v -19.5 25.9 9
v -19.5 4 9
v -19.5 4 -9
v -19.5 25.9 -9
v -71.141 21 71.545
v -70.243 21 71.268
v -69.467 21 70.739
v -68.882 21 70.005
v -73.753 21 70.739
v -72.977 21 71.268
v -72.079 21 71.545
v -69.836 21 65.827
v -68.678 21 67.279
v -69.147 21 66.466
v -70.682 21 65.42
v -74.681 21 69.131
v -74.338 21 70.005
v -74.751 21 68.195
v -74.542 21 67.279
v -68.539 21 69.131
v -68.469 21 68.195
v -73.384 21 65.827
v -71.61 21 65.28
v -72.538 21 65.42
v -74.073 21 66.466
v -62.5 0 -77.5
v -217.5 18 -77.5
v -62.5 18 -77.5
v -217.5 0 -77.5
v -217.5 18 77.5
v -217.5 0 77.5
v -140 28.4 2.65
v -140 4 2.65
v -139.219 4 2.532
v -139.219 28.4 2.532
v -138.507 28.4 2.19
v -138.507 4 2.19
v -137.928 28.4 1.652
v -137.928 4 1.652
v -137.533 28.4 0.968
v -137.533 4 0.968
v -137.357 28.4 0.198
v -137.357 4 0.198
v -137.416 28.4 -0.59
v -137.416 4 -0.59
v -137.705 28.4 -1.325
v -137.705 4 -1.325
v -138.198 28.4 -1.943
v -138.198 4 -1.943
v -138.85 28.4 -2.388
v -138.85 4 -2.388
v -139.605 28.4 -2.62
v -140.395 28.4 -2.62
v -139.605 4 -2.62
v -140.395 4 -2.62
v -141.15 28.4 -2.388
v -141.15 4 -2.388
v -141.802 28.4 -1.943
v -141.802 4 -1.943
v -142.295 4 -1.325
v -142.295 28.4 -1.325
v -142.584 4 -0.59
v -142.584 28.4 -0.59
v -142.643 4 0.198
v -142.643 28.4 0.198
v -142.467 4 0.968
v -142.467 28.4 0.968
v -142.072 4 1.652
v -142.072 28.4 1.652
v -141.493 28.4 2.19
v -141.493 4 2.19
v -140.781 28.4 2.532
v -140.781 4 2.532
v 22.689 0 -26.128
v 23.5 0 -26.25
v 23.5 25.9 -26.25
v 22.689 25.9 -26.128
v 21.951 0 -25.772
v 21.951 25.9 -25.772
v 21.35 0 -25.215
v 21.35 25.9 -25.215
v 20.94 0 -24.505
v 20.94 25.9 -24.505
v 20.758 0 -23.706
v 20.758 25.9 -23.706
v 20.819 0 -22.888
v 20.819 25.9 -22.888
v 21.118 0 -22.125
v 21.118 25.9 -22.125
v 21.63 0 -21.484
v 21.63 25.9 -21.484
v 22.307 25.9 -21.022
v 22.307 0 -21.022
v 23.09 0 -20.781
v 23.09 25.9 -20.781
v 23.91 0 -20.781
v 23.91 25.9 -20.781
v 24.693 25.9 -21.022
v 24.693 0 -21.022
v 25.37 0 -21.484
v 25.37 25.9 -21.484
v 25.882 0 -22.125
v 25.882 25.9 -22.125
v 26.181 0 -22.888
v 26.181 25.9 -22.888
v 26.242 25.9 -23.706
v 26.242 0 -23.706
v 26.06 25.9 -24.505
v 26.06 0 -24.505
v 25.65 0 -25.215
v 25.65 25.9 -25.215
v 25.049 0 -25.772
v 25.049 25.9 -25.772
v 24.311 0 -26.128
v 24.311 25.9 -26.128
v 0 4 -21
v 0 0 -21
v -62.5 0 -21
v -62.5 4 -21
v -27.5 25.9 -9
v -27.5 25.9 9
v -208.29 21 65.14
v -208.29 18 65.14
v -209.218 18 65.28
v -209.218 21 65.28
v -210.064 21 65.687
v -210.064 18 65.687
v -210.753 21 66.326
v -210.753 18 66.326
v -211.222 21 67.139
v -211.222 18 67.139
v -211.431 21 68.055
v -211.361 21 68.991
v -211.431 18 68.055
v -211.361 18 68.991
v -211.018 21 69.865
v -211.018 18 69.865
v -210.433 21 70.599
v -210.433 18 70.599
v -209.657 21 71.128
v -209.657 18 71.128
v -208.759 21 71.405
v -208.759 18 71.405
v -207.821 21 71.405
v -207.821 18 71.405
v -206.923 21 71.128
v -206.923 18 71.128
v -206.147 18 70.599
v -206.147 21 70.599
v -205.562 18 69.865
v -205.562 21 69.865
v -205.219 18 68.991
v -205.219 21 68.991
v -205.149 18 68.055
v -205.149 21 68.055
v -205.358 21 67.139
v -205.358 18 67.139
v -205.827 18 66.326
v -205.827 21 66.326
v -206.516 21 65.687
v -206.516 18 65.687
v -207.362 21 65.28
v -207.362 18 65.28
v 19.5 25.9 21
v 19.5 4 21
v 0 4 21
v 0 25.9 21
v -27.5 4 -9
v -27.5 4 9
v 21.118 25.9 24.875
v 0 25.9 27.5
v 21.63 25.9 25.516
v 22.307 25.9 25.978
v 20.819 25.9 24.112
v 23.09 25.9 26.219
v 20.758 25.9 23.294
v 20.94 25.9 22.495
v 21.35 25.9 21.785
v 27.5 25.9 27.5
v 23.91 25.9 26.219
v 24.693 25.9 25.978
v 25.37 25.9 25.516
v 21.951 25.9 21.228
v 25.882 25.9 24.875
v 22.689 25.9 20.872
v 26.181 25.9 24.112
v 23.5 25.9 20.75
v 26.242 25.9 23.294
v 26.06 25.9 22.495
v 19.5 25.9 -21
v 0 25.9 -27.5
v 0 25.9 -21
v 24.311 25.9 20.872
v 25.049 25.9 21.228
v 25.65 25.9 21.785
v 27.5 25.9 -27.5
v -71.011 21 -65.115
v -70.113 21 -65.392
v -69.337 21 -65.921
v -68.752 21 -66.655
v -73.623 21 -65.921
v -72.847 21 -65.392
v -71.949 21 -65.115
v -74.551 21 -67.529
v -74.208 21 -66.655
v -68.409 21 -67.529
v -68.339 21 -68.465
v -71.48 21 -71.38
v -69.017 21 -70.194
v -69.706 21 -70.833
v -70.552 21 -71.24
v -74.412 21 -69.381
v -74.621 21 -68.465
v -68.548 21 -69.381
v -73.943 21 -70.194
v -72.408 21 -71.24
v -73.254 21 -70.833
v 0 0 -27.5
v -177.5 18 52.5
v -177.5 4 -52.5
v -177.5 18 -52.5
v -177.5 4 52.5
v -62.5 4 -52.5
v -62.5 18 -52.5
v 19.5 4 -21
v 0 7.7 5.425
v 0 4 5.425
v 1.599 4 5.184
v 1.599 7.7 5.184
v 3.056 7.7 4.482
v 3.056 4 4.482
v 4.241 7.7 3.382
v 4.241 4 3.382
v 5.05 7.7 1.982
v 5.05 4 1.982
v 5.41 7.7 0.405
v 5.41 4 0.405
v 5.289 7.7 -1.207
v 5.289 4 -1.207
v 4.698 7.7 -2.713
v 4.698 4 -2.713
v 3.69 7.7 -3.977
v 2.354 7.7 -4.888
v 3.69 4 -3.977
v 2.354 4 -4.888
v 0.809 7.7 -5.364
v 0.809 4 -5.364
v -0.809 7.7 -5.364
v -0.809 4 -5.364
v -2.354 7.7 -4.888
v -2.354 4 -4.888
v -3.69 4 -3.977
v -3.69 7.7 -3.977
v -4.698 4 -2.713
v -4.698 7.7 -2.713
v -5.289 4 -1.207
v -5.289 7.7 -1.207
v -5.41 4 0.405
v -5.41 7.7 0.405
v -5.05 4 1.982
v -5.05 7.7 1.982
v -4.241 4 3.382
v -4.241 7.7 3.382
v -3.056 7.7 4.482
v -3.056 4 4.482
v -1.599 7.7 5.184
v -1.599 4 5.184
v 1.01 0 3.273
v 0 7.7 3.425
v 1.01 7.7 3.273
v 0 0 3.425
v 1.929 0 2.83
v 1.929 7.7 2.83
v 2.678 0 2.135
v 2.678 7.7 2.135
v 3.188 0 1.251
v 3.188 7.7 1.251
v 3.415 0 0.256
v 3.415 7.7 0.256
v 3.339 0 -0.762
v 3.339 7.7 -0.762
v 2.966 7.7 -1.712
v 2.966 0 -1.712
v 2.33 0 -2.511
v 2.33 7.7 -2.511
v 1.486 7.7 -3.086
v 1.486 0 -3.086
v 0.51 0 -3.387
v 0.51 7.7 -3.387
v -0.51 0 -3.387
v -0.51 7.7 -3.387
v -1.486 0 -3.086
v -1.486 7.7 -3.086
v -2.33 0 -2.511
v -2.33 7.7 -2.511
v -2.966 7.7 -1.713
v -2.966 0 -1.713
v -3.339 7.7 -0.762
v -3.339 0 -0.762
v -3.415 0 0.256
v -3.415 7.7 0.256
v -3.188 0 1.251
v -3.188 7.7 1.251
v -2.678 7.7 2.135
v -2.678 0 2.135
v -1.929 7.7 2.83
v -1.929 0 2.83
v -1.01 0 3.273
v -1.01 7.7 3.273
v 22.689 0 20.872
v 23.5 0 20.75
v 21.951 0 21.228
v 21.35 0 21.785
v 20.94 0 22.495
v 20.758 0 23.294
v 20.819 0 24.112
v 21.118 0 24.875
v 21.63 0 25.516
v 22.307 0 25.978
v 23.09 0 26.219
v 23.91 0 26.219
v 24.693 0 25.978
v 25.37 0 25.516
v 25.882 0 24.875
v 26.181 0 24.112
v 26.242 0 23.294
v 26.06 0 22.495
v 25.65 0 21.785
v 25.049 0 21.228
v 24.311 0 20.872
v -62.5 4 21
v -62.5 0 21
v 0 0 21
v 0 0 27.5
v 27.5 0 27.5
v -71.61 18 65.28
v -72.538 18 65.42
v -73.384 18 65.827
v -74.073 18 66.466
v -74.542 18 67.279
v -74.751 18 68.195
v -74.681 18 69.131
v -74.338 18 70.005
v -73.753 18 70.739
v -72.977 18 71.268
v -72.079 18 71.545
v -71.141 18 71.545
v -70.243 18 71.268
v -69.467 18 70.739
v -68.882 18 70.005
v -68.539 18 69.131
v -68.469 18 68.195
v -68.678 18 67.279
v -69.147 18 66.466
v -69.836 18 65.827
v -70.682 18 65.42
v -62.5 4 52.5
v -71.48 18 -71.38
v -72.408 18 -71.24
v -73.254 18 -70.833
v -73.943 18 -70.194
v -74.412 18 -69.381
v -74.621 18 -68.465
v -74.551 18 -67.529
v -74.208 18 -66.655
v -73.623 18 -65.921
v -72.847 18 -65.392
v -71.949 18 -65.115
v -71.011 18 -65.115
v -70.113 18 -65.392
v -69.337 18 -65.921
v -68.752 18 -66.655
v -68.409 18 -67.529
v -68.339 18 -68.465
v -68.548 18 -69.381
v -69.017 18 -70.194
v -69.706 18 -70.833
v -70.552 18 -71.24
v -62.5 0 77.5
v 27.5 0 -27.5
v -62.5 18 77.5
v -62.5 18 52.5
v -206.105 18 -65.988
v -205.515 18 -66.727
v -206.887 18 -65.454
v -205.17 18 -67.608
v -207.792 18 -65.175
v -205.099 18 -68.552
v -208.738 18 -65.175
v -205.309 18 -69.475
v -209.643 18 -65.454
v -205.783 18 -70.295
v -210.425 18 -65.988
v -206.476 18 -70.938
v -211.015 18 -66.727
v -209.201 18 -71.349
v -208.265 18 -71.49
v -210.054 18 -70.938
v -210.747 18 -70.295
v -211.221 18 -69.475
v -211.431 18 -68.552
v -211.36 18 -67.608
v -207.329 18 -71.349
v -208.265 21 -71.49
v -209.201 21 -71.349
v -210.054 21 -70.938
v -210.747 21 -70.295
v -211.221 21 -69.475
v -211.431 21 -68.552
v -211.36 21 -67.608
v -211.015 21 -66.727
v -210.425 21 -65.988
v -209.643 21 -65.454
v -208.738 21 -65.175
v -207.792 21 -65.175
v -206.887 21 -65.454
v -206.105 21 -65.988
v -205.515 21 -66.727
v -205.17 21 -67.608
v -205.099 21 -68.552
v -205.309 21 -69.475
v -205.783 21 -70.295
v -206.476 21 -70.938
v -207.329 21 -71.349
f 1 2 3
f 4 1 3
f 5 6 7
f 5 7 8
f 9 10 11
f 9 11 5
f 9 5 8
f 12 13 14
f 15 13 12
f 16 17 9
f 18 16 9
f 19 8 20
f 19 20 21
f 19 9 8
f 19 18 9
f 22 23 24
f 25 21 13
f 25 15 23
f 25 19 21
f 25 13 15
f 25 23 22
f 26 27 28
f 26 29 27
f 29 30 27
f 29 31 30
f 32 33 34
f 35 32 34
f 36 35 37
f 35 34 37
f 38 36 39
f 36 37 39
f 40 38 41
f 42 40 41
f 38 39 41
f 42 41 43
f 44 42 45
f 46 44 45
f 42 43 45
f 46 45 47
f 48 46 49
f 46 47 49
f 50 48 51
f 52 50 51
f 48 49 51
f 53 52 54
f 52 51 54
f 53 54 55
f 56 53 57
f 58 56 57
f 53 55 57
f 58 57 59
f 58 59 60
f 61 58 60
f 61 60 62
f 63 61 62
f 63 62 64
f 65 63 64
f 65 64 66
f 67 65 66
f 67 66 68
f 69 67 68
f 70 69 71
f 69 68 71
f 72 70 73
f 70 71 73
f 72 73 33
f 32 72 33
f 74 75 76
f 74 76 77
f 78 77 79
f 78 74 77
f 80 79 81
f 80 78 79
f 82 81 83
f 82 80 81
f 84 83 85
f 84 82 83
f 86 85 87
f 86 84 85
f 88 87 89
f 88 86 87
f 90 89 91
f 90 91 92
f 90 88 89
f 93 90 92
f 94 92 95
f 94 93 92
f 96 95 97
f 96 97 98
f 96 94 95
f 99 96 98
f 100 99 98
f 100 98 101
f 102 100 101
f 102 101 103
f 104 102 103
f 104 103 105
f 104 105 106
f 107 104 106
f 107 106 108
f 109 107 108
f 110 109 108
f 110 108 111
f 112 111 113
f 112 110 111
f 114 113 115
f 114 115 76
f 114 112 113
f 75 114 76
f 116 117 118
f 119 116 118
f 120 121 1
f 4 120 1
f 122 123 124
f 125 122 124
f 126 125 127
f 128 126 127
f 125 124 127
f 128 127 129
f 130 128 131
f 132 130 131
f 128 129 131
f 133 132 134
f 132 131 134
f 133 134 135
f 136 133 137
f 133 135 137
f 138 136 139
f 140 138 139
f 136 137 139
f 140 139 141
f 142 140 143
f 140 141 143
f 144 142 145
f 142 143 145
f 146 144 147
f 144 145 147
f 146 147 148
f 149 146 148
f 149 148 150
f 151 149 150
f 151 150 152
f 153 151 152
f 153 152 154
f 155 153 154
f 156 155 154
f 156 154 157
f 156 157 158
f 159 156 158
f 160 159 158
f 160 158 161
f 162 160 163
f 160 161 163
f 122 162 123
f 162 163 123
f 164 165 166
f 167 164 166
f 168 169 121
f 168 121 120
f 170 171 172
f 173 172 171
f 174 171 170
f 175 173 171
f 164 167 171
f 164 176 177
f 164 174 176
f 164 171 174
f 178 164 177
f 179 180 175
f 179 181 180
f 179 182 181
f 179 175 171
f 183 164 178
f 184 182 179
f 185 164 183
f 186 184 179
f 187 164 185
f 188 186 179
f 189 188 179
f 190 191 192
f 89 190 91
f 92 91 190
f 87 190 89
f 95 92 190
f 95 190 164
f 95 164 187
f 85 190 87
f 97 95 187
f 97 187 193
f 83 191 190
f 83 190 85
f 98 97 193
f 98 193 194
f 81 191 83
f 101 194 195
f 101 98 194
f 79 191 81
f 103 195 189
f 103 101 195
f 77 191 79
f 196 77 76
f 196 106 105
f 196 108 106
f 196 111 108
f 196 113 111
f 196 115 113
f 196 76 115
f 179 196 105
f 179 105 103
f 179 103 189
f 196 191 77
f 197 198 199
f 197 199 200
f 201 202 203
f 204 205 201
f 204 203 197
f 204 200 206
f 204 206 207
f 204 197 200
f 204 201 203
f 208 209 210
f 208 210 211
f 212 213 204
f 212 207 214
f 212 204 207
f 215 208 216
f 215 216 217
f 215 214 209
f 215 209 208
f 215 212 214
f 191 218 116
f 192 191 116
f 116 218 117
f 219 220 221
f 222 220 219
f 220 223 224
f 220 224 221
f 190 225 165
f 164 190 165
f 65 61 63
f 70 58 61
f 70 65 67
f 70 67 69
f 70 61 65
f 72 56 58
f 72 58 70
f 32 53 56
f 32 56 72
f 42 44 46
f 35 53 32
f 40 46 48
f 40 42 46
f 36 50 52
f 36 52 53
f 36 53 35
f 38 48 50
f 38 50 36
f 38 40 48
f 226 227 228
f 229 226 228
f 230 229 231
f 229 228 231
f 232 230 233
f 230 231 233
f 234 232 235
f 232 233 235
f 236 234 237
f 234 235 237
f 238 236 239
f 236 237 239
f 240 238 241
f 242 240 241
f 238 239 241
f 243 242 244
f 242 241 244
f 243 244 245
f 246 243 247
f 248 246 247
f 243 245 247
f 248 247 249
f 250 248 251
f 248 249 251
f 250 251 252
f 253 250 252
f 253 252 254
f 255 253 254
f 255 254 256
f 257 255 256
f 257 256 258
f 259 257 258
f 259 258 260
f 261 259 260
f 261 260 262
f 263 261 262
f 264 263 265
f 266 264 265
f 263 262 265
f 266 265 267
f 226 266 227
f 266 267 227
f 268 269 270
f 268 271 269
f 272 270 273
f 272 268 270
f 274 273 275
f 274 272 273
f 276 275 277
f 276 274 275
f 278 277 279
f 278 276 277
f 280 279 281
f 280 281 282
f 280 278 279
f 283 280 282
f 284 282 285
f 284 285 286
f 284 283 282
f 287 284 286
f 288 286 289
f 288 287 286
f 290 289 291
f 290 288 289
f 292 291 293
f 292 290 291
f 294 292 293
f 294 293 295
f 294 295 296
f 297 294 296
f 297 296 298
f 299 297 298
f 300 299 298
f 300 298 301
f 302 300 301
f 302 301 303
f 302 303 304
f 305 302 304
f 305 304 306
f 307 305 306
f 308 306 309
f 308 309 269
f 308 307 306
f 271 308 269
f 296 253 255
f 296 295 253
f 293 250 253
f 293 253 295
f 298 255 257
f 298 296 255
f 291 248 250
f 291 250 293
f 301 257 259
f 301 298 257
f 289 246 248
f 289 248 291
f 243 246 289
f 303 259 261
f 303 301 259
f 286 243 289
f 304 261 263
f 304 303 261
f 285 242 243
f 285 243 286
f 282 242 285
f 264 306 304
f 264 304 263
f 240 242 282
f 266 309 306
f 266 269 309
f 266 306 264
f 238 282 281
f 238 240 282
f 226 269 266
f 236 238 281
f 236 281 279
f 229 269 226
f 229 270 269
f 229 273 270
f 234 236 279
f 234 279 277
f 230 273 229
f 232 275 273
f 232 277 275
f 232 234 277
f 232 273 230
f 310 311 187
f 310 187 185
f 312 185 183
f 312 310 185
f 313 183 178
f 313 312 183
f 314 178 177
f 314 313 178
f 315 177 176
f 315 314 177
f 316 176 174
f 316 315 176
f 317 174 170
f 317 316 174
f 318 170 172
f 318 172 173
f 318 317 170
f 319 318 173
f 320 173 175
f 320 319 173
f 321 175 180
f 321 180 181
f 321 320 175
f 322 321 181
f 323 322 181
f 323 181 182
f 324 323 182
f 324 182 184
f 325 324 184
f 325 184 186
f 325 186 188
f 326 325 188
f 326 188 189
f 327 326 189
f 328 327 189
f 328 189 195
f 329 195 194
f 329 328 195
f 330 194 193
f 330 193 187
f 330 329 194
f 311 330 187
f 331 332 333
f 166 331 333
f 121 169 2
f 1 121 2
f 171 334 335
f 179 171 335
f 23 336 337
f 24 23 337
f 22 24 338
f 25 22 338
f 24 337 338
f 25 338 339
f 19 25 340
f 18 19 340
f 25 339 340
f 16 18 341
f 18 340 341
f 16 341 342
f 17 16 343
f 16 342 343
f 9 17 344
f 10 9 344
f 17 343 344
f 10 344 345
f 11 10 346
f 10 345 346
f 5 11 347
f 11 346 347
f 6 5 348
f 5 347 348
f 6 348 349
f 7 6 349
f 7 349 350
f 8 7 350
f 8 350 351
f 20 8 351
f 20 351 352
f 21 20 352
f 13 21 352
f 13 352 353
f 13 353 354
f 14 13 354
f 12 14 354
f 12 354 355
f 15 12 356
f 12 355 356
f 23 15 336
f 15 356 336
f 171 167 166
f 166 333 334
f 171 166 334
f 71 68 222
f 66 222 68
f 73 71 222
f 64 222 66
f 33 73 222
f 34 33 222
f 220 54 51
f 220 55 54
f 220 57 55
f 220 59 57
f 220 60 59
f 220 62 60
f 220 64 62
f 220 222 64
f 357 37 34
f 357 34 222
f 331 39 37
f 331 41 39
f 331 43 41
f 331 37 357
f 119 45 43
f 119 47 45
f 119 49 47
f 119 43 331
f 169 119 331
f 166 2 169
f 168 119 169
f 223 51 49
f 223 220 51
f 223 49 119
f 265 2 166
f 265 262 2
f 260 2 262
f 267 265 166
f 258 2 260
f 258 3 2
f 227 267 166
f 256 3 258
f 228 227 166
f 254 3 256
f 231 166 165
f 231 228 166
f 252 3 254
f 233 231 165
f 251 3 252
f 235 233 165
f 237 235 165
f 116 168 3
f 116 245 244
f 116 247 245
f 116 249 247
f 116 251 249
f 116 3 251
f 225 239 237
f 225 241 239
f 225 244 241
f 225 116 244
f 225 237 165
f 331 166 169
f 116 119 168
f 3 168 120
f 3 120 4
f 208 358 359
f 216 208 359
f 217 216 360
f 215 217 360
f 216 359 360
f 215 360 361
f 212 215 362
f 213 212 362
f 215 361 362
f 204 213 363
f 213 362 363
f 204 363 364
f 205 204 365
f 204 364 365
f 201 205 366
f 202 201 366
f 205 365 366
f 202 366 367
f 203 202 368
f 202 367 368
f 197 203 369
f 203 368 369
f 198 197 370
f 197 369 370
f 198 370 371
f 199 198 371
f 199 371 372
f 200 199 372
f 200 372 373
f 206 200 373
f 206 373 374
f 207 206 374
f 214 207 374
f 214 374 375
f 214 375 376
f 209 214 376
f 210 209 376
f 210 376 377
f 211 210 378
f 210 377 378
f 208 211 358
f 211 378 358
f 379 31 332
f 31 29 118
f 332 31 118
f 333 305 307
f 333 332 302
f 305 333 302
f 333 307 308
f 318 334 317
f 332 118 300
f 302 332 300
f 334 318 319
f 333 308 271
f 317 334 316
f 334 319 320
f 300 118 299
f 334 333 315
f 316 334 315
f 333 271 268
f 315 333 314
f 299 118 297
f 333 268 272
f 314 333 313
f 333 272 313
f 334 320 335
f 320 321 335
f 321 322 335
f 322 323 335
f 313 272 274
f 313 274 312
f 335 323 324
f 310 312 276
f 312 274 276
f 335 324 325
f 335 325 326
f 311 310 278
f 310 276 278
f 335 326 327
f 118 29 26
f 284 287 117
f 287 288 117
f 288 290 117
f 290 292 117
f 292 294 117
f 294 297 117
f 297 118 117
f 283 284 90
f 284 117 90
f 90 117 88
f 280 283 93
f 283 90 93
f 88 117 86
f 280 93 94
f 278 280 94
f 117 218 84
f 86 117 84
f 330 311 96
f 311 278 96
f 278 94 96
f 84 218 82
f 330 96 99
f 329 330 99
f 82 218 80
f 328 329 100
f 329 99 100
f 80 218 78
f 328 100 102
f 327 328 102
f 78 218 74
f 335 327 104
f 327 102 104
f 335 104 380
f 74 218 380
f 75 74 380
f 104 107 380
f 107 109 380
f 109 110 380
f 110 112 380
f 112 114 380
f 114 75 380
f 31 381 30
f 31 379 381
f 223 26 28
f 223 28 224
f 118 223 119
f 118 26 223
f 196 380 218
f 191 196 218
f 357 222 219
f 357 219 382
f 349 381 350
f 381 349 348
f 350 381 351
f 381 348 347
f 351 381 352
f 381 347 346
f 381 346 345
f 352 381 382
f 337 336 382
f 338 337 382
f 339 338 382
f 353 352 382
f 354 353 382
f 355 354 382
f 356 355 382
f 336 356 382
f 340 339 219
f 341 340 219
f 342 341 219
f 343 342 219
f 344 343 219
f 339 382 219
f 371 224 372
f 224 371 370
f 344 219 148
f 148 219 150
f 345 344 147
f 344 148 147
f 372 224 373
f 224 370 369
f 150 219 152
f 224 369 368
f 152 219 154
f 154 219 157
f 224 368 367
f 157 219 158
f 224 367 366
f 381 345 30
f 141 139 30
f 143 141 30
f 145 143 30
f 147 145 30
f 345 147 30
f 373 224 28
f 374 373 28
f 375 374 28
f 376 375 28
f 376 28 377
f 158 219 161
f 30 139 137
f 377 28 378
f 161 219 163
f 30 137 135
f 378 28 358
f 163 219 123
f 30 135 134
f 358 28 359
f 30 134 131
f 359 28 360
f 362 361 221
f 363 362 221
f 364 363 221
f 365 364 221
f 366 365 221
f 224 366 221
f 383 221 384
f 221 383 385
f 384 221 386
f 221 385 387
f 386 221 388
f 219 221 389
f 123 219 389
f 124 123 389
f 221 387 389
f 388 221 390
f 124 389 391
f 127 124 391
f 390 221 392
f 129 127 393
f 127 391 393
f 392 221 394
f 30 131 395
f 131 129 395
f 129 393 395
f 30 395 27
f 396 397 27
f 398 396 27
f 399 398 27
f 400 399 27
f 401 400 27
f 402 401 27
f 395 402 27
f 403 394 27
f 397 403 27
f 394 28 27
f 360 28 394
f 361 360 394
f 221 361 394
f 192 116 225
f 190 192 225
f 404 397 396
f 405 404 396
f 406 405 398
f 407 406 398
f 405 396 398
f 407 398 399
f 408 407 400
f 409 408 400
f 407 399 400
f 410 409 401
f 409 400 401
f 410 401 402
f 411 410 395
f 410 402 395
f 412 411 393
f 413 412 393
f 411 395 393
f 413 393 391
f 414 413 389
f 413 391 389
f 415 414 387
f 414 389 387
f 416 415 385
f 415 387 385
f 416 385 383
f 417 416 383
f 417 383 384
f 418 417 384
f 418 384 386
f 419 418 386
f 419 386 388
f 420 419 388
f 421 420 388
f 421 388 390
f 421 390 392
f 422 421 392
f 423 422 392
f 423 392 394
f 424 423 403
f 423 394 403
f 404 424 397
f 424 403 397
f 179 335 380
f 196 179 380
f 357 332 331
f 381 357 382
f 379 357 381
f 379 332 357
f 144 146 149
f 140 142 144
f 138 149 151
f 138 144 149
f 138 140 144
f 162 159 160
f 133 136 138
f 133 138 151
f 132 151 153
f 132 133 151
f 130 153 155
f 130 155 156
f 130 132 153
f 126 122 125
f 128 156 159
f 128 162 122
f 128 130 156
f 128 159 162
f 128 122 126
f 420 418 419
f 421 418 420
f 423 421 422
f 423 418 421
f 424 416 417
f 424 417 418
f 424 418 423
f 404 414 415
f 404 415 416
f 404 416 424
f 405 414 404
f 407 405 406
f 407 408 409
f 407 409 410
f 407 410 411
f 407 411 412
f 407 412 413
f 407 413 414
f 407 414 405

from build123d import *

# Parameters (mm, degrees)
SKETCH1_W           = 8
SKETCH1_H           = 18
SKETCH1_R           = 3.425
BOSS_EXTRUDE1_DEPTH = 4
SKETCH1_3_R         = 2.75
SKETCH1_3_W         = 8
SKETCH1_3_H         = 18
BOSS_EXTRUDE2_DEPTH = 25.9
SKETCH4_R           = 5.425
SKETCH4_R_2         = 3.425
BOSS_EXTRUDE5_DEPTH = 3.7
BOSS_EXTRUDE6_DEPTH = 14
SKETCH6_R           = 3.15
SKETCH6_R_2         = 3.175
BOSS_EXTRUDE7_DEPTH = 3
SKETCH7_R           = 2.65
BOSS_EXTRUDE8_DEPTH = 24.4


with BuildPart() as part:
    # Sketch1 → Boss-Extrude1 (new body)
    with BuildSketch(Plane(origin=(0, 0, 0), x_dir=(1, 0, 0), z_dir=(0, 1, 0))):
        Polygon((-62.5, -21), (0, -21), (19.5, -21), (19.5, 21), (0, 21), (-62.5, 21), (-62.5, 77.5), (-217.5, 77.5), (-217.5, -77.5), (-62.5, -77.5), align=None)
        with Locations((-23.5, 0)):
            Rectangle(SKETCH1_W, SKETCH1_H, mode=Mode.SUBTRACT)
        Circle(SKETCH1_R, mode=Mode.SUBTRACT)
    extrude(amount=BOSS_EXTRUDE1_DEPTH)

    # Sketch1<3> → Boss-Extrude2 (add)
    # profile 1 of 2: a face of its own
    with BuildSketch(Plane(origin=(0, 0, 0), x_dir=(1, 0, 0), z_dir=(0, 1, 0))):
        Polygon((0, -27.5), (27.5, -27.5), (27.5, 27.5), (0, 27.5), (0, 21), (19.5, 21), (19.5, -21), (0, -21), align=None)
        with Locations((23.5, -23.5)):
            Circle(SKETCH1_3_R, mode=Mode.SUBTRACT)
        with Locations((23.5, 23.5)):
            Circle(SKETCH1_3_R, mode=Mode.SUBTRACT)
    # profile 2 of 2: a face of its own
    with BuildSketch(Plane(origin=(0, 0, 0), x_dir=(1, 0, 0), z_dir=(0, 1, 0))):
        with Locations((-23.5, 0)):
            Rectangle(SKETCH1_3_W, SKETCH1_3_H)
    extrude(amount=BOSS_EXTRUDE2_DEPTH)

    # Sketch4 → Boss-Extrude5 (add)
    with BuildSketch(Plane(origin=(0, 4, 0), x_dir=(1, 0, 0), z_dir=(0, 1, 0))):
        Circle(SKETCH4_R)
        Circle(SKETCH4_R_2, mode=Mode.SUBTRACT)
    extrude(amount=BOSS_EXTRUDE5_DEPTH)

    # Sketch5 → Boss-Extrude6 (add)
    with BuildSketch(Plane(origin=(0, 4, 0), x_dir=(1, 0, 0), z_dir=(0, 1, 0))):
        Polygon((-217.5, 77.5), (-62.5, 77.5), (-62.5, 52.5), (-177.5, 52.5), (-177.5, -52.5), (-62.5, -52.5), (-62.5, -77.5), (-217.5, -77.5), align=None)
    extrude(amount=BOSS_EXTRUDE6_DEPTH)

    # Sketch6 → Boss-Extrude7 (add)
    with BuildSketch(Plane(origin=(0, 18, 0), x_dir=(1, 0, 0), z_dir=(0, 1, 0))):
        with Locations((-71.48, 68.23)):
            Circle(SKETCH6_R)
        with Locations((-71.61, -68.43)):
            Circle(SKETCH6_R)
        with Locations((-208.29, -68.29)):
            Circle(SKETCH6_R)
        with Locations((-208.265, 68.315)):
            Circle(SKETCH6_R_2)
    extrude(amount=BOSS_EXTRUDE7_DEPTH)

    # Sketch7 → Boss-Extrude8 (add)
    with BuildSketch(Plane(origin=(0, 4, 0), x_dir=(1, 0, 0), z_dir=(0, 1, 0))):
        with Locations((-140, 0)):
            Circle(SKETCH7_R)
    extrude(amount=BOSS_EXTRUDE8_DEPTH)


solid = part.part
